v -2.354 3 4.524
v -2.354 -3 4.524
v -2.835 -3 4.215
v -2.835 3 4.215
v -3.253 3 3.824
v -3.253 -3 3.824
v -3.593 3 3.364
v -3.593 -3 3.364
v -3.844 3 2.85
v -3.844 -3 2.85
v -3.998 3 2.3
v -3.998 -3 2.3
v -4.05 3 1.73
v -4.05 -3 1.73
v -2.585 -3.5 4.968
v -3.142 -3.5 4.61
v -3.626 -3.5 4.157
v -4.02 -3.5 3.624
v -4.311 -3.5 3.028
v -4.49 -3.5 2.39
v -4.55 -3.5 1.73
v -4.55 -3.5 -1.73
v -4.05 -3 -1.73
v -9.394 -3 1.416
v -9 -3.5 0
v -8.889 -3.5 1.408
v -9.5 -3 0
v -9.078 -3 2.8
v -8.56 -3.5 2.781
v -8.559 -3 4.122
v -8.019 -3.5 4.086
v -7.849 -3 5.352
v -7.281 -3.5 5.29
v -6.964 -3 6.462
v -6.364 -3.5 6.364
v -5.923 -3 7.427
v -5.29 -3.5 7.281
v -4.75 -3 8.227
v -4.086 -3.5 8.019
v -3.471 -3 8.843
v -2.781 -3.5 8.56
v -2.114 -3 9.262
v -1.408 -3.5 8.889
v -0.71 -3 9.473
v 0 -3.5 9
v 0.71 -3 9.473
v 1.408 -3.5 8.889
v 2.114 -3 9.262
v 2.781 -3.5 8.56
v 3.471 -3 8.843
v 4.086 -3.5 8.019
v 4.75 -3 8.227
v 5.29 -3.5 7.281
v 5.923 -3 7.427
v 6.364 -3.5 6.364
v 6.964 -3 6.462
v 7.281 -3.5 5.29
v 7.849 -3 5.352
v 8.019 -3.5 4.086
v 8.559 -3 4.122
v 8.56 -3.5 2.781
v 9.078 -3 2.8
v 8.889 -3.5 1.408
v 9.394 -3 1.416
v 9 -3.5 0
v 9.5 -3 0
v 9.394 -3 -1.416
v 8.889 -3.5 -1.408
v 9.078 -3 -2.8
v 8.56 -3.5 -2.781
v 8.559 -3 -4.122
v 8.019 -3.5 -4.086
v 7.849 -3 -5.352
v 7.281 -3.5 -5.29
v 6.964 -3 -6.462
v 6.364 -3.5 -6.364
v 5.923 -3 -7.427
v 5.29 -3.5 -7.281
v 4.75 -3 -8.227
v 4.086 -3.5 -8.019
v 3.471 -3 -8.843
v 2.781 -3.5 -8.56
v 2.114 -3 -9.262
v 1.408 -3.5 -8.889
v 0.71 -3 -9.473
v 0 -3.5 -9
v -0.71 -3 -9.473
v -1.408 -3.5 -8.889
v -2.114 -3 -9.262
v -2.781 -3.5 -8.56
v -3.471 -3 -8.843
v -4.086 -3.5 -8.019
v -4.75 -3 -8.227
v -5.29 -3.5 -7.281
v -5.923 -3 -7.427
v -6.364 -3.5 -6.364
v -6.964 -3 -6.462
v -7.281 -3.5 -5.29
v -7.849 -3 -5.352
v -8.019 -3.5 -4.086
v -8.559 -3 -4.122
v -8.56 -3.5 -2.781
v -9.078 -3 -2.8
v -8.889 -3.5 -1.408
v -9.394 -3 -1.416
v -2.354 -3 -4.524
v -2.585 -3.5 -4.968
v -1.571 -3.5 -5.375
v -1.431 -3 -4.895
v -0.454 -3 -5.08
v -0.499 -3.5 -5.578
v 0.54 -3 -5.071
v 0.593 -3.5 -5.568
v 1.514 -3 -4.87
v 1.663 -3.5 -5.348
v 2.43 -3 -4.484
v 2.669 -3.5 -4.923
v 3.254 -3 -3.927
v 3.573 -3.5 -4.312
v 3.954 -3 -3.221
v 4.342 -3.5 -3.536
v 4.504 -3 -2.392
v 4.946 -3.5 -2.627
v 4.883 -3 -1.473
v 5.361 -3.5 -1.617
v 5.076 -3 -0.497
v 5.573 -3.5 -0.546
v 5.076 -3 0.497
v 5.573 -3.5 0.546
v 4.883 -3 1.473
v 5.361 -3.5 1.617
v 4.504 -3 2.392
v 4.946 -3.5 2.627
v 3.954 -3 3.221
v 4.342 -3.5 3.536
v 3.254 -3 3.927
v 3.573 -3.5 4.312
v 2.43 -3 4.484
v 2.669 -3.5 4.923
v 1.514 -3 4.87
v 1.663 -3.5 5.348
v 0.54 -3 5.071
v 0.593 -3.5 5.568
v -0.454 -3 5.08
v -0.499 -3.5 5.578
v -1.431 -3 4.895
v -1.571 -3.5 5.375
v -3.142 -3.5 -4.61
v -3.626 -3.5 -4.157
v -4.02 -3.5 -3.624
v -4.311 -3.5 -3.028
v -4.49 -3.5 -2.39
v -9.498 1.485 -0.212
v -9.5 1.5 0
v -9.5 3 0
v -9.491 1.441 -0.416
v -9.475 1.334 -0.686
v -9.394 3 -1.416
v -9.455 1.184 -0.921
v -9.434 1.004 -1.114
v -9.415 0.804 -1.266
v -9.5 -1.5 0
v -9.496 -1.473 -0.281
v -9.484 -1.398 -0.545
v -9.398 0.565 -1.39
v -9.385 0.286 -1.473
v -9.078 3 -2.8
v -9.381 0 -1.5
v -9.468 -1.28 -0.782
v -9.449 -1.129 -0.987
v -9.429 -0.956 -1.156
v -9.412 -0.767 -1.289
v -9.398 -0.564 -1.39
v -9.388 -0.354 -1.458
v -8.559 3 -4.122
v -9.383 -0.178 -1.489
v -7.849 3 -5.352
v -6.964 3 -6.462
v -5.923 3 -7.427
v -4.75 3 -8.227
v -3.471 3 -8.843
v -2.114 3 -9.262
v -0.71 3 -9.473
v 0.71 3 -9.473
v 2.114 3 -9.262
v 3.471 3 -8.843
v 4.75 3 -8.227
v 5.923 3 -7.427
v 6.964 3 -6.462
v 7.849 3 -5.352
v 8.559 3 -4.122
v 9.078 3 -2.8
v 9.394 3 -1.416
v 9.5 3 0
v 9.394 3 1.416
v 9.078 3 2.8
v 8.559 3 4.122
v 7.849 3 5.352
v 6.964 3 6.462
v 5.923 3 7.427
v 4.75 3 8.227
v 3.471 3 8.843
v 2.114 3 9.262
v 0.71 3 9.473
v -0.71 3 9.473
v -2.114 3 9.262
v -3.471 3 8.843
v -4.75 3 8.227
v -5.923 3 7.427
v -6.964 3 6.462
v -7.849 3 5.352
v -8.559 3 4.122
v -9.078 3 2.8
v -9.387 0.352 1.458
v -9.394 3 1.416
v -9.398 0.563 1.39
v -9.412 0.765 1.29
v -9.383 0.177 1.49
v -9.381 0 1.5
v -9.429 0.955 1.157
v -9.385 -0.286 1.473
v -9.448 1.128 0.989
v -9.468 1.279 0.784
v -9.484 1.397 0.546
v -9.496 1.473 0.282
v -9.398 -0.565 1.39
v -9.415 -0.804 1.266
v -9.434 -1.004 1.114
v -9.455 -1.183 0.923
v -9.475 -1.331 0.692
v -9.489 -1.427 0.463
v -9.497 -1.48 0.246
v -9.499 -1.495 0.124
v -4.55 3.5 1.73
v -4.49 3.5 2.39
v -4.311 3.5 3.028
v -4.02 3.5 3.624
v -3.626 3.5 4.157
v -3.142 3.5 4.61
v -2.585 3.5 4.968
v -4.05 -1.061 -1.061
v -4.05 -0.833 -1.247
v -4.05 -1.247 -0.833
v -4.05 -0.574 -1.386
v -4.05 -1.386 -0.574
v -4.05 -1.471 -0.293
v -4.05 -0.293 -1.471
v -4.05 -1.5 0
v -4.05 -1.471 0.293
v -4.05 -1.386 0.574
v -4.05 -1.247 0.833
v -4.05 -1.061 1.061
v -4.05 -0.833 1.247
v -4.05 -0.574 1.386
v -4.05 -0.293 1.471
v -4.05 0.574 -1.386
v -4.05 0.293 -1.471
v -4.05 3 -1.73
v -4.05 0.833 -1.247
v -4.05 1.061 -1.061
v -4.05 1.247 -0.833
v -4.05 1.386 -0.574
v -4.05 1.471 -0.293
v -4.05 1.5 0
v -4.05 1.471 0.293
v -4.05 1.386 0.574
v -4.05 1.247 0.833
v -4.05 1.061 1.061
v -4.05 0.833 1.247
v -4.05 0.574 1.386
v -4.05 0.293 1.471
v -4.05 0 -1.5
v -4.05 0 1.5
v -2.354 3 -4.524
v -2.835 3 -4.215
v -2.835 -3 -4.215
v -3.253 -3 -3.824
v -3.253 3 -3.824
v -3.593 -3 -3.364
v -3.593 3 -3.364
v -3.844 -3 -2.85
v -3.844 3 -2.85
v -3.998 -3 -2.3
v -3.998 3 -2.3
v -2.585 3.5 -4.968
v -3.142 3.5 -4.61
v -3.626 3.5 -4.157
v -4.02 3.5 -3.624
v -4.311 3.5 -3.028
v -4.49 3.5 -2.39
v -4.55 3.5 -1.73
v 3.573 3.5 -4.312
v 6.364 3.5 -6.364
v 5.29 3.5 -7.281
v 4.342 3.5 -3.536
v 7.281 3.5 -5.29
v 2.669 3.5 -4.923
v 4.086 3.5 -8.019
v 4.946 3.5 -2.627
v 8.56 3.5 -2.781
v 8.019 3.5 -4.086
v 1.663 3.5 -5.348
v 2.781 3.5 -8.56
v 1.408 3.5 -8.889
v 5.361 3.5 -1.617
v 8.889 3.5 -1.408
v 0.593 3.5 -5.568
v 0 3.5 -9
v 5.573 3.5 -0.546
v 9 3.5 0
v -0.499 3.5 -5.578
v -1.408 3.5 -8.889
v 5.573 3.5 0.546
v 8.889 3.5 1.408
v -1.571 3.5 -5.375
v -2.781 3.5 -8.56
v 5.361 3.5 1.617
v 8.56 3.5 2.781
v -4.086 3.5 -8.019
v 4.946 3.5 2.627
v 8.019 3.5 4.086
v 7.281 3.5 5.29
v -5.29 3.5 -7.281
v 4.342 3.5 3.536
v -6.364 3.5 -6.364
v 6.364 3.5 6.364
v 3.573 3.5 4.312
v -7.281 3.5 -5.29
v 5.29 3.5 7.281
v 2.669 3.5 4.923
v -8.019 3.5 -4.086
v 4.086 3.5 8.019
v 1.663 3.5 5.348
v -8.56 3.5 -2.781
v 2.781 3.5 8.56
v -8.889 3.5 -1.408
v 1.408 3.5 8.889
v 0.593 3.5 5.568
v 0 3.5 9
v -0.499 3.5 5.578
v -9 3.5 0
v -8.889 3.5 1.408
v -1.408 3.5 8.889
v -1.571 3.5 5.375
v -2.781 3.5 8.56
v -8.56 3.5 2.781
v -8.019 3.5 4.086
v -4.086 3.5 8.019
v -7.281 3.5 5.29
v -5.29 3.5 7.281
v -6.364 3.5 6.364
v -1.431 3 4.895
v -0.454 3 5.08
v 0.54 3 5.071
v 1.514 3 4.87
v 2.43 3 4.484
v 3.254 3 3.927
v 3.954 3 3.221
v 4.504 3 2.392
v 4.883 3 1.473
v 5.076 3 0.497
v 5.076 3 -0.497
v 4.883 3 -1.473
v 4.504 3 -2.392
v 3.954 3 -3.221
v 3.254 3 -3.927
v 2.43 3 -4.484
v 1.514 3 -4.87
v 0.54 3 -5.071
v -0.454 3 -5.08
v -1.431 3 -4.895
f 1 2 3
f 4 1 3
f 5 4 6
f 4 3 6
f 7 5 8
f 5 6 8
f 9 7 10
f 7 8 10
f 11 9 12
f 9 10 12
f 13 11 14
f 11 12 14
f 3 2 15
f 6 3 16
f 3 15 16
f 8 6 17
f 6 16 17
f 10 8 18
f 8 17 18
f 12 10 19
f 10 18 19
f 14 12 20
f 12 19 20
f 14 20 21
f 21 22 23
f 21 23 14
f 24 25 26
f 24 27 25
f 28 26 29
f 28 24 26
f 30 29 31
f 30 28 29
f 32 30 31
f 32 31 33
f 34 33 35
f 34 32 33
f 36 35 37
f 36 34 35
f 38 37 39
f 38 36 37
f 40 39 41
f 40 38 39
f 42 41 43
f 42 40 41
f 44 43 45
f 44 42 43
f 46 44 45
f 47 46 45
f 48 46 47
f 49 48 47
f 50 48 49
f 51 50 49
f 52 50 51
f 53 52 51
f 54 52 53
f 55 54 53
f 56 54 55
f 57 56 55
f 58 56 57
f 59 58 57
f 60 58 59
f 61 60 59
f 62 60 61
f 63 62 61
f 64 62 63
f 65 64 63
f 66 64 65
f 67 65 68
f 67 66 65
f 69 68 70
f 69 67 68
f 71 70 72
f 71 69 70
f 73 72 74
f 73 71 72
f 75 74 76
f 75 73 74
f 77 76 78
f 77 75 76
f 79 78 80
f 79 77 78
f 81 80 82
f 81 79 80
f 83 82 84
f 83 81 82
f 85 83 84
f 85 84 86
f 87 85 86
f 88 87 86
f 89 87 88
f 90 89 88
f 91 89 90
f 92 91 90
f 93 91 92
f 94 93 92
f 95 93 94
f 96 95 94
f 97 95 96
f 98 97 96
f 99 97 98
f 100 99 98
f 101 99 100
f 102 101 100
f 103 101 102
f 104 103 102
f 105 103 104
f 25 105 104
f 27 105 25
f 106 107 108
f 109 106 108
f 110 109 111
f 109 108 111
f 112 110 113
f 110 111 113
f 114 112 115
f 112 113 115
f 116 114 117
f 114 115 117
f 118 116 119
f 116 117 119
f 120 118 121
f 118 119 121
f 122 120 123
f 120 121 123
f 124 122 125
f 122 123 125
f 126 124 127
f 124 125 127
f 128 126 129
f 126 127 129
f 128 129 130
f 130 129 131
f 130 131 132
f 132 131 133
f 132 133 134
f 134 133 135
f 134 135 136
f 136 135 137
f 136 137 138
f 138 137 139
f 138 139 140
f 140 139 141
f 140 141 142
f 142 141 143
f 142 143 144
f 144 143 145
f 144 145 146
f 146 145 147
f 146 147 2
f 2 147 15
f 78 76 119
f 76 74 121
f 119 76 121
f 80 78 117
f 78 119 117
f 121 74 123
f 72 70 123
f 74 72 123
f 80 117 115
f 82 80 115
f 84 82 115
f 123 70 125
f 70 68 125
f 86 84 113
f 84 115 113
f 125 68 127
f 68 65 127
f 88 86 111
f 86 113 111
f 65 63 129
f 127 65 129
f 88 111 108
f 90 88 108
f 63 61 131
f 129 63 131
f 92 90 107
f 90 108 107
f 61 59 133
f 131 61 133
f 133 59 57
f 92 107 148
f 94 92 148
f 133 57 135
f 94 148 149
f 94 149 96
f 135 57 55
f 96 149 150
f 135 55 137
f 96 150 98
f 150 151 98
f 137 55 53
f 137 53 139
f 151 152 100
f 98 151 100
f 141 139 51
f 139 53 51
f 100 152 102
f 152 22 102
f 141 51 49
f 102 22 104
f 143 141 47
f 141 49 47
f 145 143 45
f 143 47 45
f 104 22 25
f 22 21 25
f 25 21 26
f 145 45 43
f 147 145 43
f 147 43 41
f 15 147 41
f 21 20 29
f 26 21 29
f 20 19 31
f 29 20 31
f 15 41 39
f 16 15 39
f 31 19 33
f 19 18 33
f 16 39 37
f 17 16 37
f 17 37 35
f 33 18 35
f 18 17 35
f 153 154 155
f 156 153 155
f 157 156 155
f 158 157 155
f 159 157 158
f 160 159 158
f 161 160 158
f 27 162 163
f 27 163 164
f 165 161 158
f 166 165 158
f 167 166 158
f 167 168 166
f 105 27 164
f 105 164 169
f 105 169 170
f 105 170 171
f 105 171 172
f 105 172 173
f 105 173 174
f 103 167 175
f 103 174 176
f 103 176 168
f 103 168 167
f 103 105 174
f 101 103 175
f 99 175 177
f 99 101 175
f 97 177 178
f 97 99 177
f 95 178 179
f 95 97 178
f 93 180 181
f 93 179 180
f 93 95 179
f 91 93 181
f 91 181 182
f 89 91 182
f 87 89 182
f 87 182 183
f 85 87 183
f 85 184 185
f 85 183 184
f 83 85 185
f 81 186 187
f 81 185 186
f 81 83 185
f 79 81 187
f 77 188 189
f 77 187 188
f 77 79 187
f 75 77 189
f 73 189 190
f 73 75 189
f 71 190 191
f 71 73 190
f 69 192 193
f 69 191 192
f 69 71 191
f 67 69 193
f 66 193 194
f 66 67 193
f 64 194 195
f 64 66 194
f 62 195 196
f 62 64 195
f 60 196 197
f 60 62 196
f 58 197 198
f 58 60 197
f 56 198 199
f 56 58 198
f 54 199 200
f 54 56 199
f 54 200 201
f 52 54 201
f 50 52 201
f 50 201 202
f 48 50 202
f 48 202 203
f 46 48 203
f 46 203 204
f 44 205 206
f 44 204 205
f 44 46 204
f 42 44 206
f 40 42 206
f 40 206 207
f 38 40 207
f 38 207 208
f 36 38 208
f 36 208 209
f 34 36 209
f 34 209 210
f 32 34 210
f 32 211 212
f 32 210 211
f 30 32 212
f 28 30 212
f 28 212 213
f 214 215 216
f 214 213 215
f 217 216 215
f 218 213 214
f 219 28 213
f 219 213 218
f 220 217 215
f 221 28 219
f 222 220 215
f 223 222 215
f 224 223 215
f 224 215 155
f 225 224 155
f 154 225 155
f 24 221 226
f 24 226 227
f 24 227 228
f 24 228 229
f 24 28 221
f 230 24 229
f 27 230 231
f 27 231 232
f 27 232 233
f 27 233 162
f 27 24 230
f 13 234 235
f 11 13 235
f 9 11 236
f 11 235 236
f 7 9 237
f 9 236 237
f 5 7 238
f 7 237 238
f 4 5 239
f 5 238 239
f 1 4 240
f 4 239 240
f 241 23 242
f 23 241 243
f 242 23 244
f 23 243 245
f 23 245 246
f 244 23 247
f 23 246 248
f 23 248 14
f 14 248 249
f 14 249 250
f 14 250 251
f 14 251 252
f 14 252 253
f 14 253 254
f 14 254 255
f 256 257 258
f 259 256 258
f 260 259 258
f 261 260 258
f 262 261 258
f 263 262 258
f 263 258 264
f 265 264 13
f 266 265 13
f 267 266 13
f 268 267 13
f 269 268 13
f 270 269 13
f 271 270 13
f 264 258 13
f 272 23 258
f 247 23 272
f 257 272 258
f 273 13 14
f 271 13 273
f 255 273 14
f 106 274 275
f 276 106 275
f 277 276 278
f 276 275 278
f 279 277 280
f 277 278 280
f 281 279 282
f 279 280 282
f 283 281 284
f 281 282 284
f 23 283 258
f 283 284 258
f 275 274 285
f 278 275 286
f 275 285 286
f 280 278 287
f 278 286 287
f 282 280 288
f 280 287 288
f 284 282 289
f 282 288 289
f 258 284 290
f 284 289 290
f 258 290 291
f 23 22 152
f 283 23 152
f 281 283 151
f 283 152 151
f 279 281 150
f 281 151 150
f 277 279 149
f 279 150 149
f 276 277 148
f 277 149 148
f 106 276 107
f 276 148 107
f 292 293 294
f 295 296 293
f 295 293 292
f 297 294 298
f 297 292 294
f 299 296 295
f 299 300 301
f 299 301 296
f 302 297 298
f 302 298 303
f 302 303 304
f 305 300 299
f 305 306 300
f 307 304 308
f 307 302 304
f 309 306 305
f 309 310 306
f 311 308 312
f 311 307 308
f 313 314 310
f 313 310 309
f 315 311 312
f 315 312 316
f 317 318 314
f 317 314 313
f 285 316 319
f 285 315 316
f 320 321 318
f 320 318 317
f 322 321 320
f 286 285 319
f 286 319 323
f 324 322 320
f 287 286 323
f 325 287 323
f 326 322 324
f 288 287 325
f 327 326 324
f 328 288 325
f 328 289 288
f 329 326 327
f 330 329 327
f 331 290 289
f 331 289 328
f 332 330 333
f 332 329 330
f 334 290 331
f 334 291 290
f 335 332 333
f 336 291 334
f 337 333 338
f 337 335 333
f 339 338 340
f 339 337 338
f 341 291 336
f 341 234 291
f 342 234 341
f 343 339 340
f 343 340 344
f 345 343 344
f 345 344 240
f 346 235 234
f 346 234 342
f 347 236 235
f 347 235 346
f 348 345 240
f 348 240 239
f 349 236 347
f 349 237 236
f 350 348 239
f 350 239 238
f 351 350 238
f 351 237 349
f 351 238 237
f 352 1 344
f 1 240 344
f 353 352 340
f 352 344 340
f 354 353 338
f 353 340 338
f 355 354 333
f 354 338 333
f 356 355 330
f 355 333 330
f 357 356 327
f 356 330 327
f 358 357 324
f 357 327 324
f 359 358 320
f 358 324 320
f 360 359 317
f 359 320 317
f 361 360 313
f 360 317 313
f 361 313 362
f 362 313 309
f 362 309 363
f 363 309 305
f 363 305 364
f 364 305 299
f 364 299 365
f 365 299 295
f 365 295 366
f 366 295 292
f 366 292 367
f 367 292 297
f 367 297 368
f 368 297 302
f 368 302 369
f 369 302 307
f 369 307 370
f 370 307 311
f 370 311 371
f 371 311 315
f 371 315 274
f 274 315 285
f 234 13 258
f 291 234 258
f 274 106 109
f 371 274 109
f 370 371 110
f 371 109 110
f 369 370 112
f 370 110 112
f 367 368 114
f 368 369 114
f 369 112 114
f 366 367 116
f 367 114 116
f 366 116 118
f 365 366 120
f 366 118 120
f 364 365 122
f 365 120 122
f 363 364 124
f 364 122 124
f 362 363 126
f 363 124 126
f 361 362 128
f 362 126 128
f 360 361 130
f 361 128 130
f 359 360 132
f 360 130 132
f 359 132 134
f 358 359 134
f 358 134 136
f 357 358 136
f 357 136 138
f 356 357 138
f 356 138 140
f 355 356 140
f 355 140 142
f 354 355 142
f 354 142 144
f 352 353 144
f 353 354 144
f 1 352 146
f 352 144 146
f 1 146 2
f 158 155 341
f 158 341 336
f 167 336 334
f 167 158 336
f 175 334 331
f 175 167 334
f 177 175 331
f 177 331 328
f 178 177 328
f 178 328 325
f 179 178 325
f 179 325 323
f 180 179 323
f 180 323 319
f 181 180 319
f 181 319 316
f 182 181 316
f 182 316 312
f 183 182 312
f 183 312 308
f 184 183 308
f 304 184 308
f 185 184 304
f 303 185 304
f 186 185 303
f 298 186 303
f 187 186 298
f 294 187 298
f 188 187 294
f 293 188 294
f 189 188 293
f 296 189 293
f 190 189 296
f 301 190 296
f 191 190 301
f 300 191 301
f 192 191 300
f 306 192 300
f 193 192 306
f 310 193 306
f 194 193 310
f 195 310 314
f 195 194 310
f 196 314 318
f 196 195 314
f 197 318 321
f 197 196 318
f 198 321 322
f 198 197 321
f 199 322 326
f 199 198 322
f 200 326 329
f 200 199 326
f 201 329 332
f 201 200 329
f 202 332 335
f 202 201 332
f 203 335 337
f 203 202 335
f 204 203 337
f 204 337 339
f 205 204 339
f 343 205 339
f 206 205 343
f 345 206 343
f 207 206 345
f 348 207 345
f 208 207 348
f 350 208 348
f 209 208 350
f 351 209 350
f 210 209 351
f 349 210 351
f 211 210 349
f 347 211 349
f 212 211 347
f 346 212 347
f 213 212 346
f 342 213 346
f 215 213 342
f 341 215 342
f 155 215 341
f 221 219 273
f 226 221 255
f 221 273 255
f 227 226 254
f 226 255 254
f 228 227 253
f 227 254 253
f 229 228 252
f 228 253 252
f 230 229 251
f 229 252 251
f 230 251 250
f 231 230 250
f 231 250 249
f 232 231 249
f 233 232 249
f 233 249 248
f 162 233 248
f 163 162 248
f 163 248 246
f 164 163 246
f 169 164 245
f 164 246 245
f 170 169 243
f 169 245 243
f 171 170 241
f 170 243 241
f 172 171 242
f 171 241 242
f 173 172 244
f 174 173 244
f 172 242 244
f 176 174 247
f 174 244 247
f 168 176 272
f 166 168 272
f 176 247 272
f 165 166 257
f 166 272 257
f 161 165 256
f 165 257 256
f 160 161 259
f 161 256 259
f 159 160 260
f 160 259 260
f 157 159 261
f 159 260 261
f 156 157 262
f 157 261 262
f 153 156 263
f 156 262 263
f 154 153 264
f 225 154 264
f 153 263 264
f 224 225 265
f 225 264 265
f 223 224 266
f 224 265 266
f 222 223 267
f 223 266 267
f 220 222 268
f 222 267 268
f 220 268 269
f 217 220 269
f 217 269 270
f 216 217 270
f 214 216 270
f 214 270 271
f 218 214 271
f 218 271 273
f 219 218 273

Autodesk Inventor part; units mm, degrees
ref_plane "XZ Plane" through (0, 0, 0) normal (0, 1, 0) x (-1, 0, 0)
ref_plane "XY Plane" through (0, 0, 0) normal (0, 0, 1) x (1, 0, 0)
sketch "Body Cross Section" plane through (0, 0, 0) normal (0, 1, 0) x (-1, 0, 0)
  circle A0 centre (0, 0) radius 9.5
  arc A1 (4.05, 3.0996) -> (4.05, -3.0996) centre (0, 0) ccw
  line L0 (4.05, -3.0996) -> (4.05, 3.0996)
  dimension "d0" = 19
  dimension "d1" = 10.2
  dimension "d2" = 4.05
extrude "Body" add sketch "Body Cross Section" along normal mid plane 7
ref_plane "Hole Work Plane" through (-20, 0, 0) normal (1, 0, 0) x (0, 1, 0)
sketch "Cable Hole Position" plane through (-20, 0, 0) normal (1, 0, 0) x (0, 1, 0)
  point P0 (0, 0)
  point P1 (0, 0)
hole "Cable Hole" at (-20, 0, 0) direction (1, 0, 0) diameter 3 end up to surface
fillet "Internal Fillet" radius 3.15 2 edges at (-4.05, 0, -3.0996) (-4.05, 0, 3.0996)
chamfer "Safety Chamfer" distance 0.5 angle 45 10 edges at (-3.5928, 3.5, 3.3643) (5.1, 3.5, 0) (-3.5928, 3.5, -3.3643) (-4.05, 3.5, 0) (5.1, -3.5, 0) (-3.5928, -3.5, -3.3643) (-4.05, -3.5, 0) (-3.5928, -3.5, 3.3643) (9.5, 3.5, 0) (9.5, -3.5, 0)
properties part number "Spacer" material "Aluminum 6061"
